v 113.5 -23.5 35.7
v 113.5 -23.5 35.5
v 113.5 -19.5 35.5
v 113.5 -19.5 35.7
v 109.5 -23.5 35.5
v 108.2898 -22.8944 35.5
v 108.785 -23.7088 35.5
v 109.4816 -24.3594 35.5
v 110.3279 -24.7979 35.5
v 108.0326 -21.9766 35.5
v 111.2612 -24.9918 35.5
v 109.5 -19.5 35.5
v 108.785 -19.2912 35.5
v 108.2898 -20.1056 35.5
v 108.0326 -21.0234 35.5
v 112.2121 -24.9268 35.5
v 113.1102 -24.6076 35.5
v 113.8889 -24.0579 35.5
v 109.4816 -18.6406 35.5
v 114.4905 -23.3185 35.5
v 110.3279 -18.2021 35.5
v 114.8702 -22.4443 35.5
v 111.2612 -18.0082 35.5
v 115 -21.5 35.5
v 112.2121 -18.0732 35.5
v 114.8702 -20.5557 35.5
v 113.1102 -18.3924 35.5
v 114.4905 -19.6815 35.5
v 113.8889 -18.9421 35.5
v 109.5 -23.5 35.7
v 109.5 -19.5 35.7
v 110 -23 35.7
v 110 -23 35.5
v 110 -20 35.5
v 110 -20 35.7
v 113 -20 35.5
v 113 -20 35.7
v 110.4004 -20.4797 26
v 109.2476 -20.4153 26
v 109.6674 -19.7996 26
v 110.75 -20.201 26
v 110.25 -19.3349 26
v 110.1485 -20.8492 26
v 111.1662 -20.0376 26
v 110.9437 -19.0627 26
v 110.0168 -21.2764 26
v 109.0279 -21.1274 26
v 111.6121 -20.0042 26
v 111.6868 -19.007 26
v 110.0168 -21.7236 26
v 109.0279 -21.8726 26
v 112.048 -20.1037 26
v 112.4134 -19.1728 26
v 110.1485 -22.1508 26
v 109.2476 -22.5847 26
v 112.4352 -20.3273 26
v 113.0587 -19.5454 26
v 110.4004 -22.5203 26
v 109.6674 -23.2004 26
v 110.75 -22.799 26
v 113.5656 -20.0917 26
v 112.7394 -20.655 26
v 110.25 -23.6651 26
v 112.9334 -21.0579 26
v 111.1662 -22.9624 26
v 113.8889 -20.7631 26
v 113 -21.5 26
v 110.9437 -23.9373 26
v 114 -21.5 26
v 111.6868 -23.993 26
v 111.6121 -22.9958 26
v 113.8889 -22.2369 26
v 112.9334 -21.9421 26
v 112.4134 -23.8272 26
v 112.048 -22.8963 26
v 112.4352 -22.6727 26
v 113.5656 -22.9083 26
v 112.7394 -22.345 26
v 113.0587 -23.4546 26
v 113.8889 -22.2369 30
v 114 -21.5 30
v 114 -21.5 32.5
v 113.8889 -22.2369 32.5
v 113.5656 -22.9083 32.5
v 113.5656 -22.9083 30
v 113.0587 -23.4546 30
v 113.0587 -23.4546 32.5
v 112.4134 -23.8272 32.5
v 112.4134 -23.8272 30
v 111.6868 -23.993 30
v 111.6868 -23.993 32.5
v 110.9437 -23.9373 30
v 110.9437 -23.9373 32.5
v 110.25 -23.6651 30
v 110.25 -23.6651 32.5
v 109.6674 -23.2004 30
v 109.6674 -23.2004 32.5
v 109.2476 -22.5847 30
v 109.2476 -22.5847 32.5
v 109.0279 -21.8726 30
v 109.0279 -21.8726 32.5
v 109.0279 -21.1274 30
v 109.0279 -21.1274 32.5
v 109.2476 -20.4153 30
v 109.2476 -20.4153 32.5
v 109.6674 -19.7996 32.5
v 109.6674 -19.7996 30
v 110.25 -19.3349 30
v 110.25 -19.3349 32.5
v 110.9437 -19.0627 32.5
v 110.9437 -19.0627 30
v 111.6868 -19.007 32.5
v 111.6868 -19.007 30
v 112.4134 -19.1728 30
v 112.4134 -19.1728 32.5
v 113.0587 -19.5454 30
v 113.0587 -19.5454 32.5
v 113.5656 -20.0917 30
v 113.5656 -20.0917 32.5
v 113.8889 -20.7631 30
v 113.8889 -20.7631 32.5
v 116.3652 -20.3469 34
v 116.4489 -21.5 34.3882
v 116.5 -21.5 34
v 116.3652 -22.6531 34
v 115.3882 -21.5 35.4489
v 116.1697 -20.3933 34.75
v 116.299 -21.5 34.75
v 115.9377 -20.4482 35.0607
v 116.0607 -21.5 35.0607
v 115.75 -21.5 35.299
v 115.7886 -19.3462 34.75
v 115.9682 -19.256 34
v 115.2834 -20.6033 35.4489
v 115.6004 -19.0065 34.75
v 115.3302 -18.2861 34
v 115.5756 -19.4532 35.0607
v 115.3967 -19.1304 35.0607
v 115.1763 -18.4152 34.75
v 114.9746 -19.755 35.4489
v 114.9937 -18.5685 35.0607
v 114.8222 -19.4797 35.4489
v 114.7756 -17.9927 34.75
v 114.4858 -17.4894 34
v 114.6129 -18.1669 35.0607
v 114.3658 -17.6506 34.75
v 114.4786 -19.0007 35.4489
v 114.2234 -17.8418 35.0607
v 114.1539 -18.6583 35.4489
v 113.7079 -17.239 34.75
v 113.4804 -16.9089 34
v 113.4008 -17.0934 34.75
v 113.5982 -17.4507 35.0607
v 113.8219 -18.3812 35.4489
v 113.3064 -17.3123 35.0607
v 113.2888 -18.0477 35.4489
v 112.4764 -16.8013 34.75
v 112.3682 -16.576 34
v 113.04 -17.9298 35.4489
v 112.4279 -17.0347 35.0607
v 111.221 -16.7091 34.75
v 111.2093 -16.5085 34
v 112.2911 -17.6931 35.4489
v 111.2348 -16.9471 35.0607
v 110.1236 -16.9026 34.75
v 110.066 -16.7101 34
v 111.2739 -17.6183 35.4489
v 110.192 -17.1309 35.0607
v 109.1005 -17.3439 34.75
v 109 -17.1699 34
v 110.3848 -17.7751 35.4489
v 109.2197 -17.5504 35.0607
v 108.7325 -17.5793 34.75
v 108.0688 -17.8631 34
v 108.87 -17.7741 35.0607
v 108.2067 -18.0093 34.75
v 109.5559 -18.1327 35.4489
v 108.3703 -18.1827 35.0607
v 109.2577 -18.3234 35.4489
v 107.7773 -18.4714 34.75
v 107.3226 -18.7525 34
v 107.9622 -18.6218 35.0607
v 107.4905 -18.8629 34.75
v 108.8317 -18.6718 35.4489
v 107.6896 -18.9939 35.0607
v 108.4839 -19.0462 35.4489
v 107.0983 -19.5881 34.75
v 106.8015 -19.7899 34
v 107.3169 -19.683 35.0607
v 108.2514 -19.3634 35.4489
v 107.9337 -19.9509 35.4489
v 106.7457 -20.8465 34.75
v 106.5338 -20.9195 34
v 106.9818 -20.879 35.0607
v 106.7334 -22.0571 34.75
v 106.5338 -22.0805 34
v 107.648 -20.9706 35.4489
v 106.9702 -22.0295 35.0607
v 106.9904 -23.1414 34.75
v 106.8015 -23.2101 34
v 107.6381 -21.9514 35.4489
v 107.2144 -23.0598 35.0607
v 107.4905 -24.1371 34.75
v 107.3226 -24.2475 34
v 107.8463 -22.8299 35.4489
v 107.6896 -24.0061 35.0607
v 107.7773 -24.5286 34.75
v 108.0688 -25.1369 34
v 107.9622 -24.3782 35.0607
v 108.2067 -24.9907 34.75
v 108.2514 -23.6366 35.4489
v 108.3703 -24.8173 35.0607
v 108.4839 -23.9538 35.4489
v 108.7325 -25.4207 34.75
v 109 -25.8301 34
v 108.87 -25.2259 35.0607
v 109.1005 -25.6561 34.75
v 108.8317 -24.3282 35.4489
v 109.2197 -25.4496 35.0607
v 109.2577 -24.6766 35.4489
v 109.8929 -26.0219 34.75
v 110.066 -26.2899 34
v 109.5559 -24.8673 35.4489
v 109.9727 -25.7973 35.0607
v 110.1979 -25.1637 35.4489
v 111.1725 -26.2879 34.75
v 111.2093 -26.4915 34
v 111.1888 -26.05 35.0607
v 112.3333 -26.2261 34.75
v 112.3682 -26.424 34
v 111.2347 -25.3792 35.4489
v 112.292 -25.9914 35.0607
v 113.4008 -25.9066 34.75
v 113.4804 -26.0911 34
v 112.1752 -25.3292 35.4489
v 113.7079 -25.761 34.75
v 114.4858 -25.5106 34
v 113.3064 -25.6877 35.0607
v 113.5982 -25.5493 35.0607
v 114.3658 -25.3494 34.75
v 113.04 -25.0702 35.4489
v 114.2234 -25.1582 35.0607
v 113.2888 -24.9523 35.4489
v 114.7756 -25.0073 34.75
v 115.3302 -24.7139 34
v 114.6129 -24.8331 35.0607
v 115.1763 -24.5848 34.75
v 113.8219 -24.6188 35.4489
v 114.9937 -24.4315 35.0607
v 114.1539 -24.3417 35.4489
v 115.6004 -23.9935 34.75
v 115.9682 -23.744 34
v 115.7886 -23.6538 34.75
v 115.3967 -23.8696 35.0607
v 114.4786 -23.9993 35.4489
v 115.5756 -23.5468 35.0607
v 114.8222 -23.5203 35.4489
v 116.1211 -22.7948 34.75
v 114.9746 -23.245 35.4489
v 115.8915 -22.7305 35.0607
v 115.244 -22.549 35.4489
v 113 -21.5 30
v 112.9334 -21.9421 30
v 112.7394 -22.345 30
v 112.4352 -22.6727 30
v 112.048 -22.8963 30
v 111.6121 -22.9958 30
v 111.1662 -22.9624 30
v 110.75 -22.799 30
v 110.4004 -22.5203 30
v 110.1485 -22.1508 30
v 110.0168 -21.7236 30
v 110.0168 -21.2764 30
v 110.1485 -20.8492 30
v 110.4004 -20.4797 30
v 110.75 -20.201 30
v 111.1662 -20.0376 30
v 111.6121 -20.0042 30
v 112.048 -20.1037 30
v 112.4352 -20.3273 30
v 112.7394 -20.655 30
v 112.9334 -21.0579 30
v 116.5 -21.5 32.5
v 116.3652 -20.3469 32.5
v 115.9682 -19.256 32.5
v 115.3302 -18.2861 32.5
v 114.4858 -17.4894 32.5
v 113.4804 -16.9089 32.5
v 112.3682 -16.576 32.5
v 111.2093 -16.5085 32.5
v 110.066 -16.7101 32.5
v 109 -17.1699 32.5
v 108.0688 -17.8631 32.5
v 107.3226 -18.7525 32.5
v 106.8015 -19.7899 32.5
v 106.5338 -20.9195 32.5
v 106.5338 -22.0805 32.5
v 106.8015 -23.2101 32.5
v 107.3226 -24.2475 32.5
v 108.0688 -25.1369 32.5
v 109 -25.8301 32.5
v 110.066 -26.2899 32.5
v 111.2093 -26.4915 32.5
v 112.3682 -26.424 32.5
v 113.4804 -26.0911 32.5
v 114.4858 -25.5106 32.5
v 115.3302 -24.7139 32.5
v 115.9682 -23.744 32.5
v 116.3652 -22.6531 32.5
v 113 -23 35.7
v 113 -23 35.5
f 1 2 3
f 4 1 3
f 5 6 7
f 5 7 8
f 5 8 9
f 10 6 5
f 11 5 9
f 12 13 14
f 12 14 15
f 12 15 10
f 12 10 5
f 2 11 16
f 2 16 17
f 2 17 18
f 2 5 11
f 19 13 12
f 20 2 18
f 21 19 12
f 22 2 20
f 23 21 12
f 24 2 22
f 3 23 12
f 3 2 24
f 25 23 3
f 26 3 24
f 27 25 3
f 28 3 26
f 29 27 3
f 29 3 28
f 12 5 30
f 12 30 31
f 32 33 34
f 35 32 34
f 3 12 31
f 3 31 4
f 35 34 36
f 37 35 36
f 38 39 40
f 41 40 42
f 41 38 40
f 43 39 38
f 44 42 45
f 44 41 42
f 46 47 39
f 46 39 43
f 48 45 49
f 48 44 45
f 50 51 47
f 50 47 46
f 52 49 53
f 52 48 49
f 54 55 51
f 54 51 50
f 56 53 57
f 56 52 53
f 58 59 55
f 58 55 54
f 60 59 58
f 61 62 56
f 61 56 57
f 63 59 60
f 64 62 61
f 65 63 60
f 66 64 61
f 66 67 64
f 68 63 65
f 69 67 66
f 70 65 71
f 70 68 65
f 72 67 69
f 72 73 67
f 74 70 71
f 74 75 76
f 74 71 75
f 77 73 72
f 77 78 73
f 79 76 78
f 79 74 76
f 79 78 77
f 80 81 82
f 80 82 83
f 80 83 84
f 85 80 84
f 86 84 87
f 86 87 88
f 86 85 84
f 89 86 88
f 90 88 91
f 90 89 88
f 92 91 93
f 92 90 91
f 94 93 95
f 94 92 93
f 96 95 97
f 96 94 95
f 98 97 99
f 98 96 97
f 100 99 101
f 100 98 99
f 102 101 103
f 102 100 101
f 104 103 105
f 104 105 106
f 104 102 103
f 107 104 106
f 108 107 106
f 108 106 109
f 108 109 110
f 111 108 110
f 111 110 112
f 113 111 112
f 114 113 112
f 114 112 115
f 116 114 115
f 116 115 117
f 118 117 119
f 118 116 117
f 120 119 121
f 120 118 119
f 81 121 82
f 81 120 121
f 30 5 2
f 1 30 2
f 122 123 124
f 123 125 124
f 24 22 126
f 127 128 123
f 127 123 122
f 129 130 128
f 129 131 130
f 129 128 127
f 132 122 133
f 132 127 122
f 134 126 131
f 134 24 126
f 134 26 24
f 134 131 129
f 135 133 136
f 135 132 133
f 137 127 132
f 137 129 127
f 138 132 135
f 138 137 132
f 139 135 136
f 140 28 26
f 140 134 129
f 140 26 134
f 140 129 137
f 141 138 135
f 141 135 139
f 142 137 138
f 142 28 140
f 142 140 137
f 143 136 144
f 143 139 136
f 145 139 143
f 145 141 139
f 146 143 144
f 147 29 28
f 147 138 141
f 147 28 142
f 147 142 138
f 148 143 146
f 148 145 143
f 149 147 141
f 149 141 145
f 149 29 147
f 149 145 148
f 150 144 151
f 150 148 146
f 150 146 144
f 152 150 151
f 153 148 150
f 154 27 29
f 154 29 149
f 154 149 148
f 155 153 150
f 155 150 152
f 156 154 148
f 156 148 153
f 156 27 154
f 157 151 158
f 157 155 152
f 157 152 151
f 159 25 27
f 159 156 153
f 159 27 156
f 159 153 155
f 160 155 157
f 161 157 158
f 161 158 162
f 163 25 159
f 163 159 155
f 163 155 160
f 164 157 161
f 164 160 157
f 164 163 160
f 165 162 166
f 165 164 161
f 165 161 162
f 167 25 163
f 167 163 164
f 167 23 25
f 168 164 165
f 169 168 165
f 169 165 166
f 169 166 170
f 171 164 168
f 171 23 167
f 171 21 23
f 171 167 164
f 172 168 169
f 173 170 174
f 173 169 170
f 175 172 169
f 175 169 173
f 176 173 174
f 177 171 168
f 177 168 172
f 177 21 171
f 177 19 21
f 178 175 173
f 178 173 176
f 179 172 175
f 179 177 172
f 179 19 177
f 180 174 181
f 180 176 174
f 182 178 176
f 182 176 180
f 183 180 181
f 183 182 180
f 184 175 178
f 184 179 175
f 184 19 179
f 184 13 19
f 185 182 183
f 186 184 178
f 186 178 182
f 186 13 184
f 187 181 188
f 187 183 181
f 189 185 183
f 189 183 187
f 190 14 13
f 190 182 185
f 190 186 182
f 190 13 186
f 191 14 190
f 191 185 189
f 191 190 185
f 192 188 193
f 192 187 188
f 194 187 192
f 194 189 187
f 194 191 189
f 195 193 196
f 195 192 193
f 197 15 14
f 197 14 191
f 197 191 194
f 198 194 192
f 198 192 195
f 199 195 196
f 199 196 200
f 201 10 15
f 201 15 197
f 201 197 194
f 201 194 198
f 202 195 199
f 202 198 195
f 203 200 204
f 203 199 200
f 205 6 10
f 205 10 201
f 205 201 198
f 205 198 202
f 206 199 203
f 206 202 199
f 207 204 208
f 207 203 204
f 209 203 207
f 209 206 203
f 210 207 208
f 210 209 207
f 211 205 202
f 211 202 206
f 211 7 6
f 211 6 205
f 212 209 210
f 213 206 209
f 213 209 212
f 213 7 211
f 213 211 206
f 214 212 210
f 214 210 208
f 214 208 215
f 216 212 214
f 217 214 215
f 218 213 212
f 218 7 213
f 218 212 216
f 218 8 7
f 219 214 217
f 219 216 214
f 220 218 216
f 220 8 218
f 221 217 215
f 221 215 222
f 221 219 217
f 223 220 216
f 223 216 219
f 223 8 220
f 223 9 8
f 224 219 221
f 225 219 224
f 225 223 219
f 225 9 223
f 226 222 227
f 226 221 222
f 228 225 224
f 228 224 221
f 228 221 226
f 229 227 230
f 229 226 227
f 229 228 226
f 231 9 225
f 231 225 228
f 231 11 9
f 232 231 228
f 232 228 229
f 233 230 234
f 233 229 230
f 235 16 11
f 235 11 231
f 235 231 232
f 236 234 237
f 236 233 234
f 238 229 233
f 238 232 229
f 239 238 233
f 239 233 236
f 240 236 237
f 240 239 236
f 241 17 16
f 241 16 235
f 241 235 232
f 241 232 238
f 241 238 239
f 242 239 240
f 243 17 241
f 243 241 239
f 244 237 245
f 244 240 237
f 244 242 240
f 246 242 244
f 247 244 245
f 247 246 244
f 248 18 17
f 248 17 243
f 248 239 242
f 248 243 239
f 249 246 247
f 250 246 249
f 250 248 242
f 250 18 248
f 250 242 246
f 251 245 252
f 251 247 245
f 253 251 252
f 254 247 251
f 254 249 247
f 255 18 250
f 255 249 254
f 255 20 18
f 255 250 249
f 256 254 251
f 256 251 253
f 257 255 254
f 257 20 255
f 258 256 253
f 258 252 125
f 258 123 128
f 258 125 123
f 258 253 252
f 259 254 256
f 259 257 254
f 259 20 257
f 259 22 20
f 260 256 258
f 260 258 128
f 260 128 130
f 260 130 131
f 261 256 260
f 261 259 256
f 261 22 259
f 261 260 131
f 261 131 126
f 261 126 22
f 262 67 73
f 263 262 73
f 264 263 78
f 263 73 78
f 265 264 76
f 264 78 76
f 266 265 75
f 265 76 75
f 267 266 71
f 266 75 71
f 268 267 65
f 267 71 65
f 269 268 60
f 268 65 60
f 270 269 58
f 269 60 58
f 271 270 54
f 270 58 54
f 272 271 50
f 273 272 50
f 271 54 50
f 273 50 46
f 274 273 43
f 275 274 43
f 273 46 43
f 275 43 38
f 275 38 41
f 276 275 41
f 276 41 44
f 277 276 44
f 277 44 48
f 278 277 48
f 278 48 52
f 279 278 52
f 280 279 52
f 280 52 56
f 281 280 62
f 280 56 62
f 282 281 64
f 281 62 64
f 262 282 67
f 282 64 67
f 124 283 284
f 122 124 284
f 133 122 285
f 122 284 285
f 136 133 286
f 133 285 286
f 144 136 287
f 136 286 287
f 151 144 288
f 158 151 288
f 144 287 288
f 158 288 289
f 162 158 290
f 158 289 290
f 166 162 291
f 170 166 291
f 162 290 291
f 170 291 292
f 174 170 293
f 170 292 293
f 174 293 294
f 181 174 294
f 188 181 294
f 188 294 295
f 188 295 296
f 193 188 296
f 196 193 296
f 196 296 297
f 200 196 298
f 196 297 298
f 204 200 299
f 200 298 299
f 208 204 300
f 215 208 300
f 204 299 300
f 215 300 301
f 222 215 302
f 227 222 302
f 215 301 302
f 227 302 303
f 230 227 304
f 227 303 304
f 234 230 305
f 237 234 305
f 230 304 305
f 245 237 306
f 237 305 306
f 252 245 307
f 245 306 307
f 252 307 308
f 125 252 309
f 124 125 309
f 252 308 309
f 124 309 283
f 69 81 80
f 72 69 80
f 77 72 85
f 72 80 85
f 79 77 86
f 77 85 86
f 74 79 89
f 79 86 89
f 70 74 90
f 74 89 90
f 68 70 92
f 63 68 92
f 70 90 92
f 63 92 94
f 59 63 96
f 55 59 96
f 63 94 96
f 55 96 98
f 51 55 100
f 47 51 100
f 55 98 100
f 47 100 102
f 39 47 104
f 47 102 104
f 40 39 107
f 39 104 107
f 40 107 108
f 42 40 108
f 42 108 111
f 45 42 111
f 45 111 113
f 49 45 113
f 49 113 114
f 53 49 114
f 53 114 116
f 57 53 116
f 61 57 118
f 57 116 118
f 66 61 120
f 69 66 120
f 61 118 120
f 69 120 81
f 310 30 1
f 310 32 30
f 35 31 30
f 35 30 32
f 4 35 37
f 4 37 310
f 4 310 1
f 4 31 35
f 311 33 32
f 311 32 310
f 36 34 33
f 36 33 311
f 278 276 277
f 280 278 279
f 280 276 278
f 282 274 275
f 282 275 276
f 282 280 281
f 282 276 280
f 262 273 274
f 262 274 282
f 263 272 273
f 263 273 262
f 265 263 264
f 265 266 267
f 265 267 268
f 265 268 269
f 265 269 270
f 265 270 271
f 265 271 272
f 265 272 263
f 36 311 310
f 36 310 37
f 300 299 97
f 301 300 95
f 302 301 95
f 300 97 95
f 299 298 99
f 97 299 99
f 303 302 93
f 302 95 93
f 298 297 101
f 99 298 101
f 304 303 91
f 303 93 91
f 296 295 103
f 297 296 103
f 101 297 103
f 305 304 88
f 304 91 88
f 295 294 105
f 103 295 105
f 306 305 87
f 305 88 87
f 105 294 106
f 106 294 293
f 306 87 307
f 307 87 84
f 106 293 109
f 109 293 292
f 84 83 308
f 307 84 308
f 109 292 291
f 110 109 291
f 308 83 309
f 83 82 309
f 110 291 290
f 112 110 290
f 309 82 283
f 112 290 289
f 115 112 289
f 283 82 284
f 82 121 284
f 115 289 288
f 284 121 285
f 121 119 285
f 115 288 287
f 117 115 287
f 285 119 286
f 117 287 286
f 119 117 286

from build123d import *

# Parameters (mm, degrees)
SKETCH046_R     = 2.5
PAD023_DEPTH    = 2.5
SKETCH047_R     = 5
PAD024_DEPTH    = 3
FILLET003_R     = 1.5
SKETCH049_R     = 2.5
PAD025_DEPTH    = 4
SKETCH050_R     = 1.5
POCKET026_DEPTH = 4
SKETCH091_W     = 4
SKETCH091_H     = 4
SKETCH091_W_2   = 3
SKETCH091_H_2   = 3
PAD057_DEPTH    = 0.2


with BuildPart() as part:
    # Sketch046 → Pad023 (new body)
    with BuildSketch(Plane(origin=(0, 0, 30), x_dir=(1, 0, 0), z_dir=(0, 0, -1))):
        with Locations((101, 55)):
            Circle(SKETCH046_R)
    extrude(amount=-PAD023_DEPTH)

    # Sketch047 (on Face3 of Pad023) → Pad024 (join)
    with BuildSketch(Plane.XY.offset(32.5)):
        with Locations((101, -55)):
            Circle(SKETCH047_R)
    extrude(amount=PAD024_DEPTH)

    # Fillet003
    fillet003_edges = [part.edges().sort_by_distance(p)[0] for p in [
        (96, -55, 35.5),
    ]]
    fillet(fillet003_edges, radius=FILLET003_R)

    # Sketch049 → Pad025 (join)
    with BuildSketch(Plane(origin=(0, 0, 30), x_dir=(1, 0, 0), z_dir=(0, 0, -1))):
        with Locations((101, 55)):
            Circle(SKETCH049_R)
    extrude(amount=PAD025_DEPTH)

    # Sketch050 (on Face17 of Pad025) → Pocket026 (cut)
    with BuildSketch(Plane(origin=(0, 0, 26), x_dir=(1, 0, 0), z_dir=(0, 0, -1))):
        with Locations((101, 55)):
            Circle(SKETCH050_R)
    extrude(amount=-POCKET026_DEPTH, mode=Mode.SUBTRACT)


with BuildPart() as part_1:
    # Body002 placement: moved
    add(part.part.moved(Location((75, 0, 0))))

    # Sketch091 (on Face4 of Clone005) → Pad057 (new body)
    with BuildSketch(Plane(origin=(75, 0, 35.5), x_dir=(1, 0, 0), z_dir=(0, 0, 1))):
        with Locations((101, -55)):
            Rectangle(SKETCH091_W, SKETCH091_H)
        with Locations((101, -55)):
            Rectangle(SKETCH091_W_2, SKETCH091_H_2, mode=Mode.SUBTRACT)
    extrude(amount=PAD057_DEPTH)


with BuildPart() as part_2:
    # Body014 placement: moved
    add(part_1.part.moved(Location((-64.5, 33.5, 0))))


solid = part_2.part
